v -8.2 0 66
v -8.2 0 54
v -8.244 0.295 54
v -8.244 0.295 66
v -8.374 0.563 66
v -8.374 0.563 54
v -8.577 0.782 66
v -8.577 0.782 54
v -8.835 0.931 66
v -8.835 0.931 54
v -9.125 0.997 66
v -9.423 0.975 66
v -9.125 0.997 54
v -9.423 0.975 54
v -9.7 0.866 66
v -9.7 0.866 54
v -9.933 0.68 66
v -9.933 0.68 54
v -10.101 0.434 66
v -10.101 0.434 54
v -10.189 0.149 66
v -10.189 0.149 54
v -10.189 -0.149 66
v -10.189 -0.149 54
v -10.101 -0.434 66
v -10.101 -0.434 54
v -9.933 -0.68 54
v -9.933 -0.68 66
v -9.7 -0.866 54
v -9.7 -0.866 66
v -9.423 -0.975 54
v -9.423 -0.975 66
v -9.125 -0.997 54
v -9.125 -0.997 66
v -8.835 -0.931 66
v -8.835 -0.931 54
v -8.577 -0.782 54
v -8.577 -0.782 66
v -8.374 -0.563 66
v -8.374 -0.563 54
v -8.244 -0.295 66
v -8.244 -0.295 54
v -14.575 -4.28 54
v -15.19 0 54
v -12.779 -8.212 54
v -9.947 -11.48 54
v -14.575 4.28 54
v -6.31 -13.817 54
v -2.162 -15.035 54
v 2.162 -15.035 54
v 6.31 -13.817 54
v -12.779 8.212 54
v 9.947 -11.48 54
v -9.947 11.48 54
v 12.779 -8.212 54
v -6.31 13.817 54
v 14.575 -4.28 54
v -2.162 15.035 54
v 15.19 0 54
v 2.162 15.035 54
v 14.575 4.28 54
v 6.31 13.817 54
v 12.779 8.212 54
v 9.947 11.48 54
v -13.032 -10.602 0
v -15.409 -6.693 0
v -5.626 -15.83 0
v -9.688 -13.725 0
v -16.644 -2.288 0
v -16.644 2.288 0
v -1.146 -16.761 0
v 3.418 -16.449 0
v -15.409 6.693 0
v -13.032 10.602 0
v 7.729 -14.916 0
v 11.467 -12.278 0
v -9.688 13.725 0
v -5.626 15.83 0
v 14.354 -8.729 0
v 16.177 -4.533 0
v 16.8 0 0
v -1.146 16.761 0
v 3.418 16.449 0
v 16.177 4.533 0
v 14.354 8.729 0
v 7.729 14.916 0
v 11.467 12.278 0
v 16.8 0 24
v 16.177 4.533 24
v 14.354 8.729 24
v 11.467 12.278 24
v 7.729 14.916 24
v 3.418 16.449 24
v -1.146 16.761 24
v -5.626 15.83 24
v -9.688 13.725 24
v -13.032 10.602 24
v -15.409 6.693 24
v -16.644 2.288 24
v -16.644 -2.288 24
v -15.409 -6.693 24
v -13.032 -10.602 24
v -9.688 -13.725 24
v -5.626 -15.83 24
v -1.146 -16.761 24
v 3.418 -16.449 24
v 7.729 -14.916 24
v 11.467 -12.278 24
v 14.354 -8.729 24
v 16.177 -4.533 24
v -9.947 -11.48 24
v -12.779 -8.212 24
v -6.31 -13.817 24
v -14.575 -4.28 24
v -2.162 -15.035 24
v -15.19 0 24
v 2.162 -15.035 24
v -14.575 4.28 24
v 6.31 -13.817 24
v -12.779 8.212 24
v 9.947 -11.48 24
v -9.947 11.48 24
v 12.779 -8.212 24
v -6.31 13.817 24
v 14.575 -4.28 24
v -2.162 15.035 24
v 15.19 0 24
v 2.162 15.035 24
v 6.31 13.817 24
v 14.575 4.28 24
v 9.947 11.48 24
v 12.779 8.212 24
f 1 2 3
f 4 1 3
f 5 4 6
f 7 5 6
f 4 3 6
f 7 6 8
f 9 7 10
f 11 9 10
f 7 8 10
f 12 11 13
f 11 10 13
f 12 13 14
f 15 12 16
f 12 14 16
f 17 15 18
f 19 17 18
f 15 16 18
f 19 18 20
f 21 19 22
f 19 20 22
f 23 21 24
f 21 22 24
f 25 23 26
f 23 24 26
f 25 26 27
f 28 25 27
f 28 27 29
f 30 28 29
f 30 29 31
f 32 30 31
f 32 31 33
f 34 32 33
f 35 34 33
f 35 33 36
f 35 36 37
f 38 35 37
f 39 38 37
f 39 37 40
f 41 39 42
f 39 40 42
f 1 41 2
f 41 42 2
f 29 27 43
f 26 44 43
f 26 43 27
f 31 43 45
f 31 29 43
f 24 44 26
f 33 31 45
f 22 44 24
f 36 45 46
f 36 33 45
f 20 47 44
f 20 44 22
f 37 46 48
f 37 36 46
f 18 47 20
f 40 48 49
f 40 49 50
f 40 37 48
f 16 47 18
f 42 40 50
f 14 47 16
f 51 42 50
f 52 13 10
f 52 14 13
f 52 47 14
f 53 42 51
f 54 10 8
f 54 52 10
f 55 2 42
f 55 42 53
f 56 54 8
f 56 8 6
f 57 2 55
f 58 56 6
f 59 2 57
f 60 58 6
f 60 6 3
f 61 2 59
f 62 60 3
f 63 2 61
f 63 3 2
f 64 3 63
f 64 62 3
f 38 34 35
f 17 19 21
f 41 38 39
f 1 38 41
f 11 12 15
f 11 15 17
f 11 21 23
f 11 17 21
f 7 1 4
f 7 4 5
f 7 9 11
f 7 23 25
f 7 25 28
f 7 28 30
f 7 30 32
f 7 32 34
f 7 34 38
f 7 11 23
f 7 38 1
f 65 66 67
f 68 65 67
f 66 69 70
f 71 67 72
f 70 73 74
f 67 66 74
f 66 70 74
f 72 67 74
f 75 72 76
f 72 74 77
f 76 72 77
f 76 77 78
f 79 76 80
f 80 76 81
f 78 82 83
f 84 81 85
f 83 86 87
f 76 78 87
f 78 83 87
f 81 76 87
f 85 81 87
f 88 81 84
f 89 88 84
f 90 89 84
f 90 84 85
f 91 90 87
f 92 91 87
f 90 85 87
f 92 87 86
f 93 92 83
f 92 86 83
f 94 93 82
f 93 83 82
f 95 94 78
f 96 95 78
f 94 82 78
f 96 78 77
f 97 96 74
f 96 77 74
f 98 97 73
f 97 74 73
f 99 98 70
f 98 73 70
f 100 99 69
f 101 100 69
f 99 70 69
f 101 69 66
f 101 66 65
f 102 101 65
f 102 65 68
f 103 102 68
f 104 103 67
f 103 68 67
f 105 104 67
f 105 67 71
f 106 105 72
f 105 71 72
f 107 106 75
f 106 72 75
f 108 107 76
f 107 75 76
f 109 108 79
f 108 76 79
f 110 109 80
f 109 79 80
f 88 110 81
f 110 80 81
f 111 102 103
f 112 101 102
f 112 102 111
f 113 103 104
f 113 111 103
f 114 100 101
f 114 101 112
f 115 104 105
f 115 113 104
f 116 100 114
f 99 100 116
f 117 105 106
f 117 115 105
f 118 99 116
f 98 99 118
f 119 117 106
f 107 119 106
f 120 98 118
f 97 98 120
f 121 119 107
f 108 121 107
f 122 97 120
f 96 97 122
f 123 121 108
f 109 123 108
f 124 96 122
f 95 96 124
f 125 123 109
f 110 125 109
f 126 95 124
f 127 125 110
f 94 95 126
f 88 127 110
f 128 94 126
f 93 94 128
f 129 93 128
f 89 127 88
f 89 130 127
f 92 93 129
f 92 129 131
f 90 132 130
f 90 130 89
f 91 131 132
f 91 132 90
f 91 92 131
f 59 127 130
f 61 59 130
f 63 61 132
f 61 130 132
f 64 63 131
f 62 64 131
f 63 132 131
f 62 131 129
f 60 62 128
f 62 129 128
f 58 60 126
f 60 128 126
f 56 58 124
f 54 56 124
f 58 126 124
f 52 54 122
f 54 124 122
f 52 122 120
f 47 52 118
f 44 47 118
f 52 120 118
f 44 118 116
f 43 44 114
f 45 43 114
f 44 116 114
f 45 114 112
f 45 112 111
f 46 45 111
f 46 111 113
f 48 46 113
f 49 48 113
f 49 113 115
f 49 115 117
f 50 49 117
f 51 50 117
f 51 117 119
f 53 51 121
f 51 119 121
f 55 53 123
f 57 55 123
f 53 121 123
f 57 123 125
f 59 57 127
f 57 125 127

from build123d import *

# Parameters (mm, degrees)
SKETCH_R     = 16.8
PAD_DEPTH    = 24
SKETCH001_R  = 15.19
PAD001_DEPTH = 30
SKETCH002_R  = 1
PAD002_DEPTH = 12


with BuildPart() as part:
    # Sketch → Pad (new body)
    with BuildSketch(Plane.XY):
        Circle(SKETCH_R)
    extrude(amount=PAD_DEPTH)

    # Sketch001 → Pad001 (new body)
    with BuildSketch(Plane.XY.offset(24)):
        Circle(SKETCH001_R)
    extrude(amount=PAD001_DEPTH)

    # Sketch002 → Pad002 (new body)
    with BuildSketch(Plane.XY.offset(54)):
        with Locations((-9.2, 0)):
            Circle(SKETCH002_R)
    extrude(amount=PAD002_DEPTH)


solid = part.part
